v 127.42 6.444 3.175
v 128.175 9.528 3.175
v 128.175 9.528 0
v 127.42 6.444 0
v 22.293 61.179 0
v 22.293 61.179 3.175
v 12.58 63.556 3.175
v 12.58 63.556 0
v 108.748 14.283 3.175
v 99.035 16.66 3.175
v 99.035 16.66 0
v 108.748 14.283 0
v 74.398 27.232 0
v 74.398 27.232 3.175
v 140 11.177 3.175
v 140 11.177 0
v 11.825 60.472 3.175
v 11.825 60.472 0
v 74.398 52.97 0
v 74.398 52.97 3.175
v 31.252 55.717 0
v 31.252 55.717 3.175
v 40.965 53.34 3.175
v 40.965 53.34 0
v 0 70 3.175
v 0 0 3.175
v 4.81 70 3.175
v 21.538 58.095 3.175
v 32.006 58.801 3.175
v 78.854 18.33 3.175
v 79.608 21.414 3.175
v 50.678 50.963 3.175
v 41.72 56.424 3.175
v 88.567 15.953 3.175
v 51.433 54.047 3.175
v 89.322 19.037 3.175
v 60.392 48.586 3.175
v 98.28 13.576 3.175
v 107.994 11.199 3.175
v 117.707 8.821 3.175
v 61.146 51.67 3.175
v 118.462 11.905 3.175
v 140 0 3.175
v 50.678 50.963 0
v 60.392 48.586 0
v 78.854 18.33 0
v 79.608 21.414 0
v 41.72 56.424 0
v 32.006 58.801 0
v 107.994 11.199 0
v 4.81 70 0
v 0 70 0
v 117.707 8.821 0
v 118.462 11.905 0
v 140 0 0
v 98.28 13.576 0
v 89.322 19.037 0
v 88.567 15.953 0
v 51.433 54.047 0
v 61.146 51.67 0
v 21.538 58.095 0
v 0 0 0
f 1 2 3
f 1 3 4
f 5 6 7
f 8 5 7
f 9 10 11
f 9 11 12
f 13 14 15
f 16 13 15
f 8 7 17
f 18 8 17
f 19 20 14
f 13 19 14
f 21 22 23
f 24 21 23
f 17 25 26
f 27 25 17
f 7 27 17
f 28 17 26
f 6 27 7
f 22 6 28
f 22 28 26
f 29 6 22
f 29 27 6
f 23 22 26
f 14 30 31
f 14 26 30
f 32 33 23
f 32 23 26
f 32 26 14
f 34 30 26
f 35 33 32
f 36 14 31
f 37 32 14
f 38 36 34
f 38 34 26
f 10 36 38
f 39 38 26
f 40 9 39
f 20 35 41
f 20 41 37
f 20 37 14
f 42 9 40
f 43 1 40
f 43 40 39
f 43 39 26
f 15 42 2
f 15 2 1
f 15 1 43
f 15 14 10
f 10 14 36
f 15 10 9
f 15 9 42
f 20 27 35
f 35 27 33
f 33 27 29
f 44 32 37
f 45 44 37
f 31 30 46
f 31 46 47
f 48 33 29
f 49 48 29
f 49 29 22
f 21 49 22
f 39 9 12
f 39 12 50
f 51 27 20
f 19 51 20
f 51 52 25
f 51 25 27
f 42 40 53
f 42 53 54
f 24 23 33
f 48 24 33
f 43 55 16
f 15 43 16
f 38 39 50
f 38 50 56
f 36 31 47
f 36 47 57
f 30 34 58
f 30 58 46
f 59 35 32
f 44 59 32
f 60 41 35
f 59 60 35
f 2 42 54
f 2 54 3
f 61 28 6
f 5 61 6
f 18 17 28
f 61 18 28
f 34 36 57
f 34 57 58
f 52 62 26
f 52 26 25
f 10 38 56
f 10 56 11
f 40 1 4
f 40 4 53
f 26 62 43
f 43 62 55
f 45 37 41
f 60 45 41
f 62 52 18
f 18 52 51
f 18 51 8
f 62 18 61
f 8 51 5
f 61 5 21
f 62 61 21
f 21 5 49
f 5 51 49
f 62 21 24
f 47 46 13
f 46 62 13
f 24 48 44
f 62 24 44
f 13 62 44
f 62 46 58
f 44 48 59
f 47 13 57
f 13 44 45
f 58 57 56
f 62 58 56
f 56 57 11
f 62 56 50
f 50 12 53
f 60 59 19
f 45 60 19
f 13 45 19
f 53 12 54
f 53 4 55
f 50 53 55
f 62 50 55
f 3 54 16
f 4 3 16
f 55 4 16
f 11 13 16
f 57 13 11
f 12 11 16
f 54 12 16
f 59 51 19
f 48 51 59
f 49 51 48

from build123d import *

# Parameters (mm, degrees)
SKETCH1_W           = 140
SKETCH1_H           = 70
BOSS_EXTRUDE1_DEPTH = 3.175
CUT_EXTRUDE1_DEPTH  = 4.175
CUT_EXTRUDE2_DEPTH  = 4.175


with BuildPart() as part:
    # Sketch1 → Boss-Extrude1 (new body)
    with BuildSketch(Plane.XY):
        with Locations((70, 35)):
            Rectangle(SKETCH1_W, SKETCH1_H)
    extrude(amount=BOSS_EXTRUDE1_DEPTH)

    # Sketch4 → Cut-Extrude1 (cut, through all)
    with BuildSketch(Plane.XY.offset(3.175)):
        Polygon((12.579717356, 63.555712168), (11.824972296, 60.471723696), (21.538321814, 58.094573903), (22.293066874, 61.178562375), align=None)
        Polygon((41.71976591, 56.424262788), (32.006416392, 58.801412581), (31.251671332, 55.71742411), (40.96502085, 53.340274316), align=None)
        Polygon((61.146464946, 51.669963201), (51.433115428, 54.047112995), (50.678370368, 50.963124523), (60.391719886, 48.585974729), align=None)
        Polygon((118.461678186, 11.905426097), (128.175027704, 9.528276304), (127.420282644, 6.444287832), (117.706933126, 8.821437625), align=None)
        Polygon((98.28023409, 13.575737212), (99.03497915, 16.659725684), (108.748328668, 14.28257589), (107.993583608, 11.198587419), align=None)
        Polygon((78.853535054, 18.330036799), (79.608280114, 21.414025271), (89.321629632, 19.036875477), (88.566884572, 15.952887005), align=None)
    extrude(amount=-CUT_EXTRUDE1_DEPTH, mode=Mode.SUBTRACT)

    # Sketch5 → Cut-Extrude2 (cut, through all)
    with BuildSketch(Plane.XY.offset(3.175)):
        Polygon((4.809647436, 70), (74.397727118, 52.969696608), (74.397727118, 27.23192206), (140, 11.177065891), (140, 70), align=None)
    extrude(amount=-CUT_EXTRUDE2_DEPTH, mode=Mode.SUBTRACT)


solid = part.part
